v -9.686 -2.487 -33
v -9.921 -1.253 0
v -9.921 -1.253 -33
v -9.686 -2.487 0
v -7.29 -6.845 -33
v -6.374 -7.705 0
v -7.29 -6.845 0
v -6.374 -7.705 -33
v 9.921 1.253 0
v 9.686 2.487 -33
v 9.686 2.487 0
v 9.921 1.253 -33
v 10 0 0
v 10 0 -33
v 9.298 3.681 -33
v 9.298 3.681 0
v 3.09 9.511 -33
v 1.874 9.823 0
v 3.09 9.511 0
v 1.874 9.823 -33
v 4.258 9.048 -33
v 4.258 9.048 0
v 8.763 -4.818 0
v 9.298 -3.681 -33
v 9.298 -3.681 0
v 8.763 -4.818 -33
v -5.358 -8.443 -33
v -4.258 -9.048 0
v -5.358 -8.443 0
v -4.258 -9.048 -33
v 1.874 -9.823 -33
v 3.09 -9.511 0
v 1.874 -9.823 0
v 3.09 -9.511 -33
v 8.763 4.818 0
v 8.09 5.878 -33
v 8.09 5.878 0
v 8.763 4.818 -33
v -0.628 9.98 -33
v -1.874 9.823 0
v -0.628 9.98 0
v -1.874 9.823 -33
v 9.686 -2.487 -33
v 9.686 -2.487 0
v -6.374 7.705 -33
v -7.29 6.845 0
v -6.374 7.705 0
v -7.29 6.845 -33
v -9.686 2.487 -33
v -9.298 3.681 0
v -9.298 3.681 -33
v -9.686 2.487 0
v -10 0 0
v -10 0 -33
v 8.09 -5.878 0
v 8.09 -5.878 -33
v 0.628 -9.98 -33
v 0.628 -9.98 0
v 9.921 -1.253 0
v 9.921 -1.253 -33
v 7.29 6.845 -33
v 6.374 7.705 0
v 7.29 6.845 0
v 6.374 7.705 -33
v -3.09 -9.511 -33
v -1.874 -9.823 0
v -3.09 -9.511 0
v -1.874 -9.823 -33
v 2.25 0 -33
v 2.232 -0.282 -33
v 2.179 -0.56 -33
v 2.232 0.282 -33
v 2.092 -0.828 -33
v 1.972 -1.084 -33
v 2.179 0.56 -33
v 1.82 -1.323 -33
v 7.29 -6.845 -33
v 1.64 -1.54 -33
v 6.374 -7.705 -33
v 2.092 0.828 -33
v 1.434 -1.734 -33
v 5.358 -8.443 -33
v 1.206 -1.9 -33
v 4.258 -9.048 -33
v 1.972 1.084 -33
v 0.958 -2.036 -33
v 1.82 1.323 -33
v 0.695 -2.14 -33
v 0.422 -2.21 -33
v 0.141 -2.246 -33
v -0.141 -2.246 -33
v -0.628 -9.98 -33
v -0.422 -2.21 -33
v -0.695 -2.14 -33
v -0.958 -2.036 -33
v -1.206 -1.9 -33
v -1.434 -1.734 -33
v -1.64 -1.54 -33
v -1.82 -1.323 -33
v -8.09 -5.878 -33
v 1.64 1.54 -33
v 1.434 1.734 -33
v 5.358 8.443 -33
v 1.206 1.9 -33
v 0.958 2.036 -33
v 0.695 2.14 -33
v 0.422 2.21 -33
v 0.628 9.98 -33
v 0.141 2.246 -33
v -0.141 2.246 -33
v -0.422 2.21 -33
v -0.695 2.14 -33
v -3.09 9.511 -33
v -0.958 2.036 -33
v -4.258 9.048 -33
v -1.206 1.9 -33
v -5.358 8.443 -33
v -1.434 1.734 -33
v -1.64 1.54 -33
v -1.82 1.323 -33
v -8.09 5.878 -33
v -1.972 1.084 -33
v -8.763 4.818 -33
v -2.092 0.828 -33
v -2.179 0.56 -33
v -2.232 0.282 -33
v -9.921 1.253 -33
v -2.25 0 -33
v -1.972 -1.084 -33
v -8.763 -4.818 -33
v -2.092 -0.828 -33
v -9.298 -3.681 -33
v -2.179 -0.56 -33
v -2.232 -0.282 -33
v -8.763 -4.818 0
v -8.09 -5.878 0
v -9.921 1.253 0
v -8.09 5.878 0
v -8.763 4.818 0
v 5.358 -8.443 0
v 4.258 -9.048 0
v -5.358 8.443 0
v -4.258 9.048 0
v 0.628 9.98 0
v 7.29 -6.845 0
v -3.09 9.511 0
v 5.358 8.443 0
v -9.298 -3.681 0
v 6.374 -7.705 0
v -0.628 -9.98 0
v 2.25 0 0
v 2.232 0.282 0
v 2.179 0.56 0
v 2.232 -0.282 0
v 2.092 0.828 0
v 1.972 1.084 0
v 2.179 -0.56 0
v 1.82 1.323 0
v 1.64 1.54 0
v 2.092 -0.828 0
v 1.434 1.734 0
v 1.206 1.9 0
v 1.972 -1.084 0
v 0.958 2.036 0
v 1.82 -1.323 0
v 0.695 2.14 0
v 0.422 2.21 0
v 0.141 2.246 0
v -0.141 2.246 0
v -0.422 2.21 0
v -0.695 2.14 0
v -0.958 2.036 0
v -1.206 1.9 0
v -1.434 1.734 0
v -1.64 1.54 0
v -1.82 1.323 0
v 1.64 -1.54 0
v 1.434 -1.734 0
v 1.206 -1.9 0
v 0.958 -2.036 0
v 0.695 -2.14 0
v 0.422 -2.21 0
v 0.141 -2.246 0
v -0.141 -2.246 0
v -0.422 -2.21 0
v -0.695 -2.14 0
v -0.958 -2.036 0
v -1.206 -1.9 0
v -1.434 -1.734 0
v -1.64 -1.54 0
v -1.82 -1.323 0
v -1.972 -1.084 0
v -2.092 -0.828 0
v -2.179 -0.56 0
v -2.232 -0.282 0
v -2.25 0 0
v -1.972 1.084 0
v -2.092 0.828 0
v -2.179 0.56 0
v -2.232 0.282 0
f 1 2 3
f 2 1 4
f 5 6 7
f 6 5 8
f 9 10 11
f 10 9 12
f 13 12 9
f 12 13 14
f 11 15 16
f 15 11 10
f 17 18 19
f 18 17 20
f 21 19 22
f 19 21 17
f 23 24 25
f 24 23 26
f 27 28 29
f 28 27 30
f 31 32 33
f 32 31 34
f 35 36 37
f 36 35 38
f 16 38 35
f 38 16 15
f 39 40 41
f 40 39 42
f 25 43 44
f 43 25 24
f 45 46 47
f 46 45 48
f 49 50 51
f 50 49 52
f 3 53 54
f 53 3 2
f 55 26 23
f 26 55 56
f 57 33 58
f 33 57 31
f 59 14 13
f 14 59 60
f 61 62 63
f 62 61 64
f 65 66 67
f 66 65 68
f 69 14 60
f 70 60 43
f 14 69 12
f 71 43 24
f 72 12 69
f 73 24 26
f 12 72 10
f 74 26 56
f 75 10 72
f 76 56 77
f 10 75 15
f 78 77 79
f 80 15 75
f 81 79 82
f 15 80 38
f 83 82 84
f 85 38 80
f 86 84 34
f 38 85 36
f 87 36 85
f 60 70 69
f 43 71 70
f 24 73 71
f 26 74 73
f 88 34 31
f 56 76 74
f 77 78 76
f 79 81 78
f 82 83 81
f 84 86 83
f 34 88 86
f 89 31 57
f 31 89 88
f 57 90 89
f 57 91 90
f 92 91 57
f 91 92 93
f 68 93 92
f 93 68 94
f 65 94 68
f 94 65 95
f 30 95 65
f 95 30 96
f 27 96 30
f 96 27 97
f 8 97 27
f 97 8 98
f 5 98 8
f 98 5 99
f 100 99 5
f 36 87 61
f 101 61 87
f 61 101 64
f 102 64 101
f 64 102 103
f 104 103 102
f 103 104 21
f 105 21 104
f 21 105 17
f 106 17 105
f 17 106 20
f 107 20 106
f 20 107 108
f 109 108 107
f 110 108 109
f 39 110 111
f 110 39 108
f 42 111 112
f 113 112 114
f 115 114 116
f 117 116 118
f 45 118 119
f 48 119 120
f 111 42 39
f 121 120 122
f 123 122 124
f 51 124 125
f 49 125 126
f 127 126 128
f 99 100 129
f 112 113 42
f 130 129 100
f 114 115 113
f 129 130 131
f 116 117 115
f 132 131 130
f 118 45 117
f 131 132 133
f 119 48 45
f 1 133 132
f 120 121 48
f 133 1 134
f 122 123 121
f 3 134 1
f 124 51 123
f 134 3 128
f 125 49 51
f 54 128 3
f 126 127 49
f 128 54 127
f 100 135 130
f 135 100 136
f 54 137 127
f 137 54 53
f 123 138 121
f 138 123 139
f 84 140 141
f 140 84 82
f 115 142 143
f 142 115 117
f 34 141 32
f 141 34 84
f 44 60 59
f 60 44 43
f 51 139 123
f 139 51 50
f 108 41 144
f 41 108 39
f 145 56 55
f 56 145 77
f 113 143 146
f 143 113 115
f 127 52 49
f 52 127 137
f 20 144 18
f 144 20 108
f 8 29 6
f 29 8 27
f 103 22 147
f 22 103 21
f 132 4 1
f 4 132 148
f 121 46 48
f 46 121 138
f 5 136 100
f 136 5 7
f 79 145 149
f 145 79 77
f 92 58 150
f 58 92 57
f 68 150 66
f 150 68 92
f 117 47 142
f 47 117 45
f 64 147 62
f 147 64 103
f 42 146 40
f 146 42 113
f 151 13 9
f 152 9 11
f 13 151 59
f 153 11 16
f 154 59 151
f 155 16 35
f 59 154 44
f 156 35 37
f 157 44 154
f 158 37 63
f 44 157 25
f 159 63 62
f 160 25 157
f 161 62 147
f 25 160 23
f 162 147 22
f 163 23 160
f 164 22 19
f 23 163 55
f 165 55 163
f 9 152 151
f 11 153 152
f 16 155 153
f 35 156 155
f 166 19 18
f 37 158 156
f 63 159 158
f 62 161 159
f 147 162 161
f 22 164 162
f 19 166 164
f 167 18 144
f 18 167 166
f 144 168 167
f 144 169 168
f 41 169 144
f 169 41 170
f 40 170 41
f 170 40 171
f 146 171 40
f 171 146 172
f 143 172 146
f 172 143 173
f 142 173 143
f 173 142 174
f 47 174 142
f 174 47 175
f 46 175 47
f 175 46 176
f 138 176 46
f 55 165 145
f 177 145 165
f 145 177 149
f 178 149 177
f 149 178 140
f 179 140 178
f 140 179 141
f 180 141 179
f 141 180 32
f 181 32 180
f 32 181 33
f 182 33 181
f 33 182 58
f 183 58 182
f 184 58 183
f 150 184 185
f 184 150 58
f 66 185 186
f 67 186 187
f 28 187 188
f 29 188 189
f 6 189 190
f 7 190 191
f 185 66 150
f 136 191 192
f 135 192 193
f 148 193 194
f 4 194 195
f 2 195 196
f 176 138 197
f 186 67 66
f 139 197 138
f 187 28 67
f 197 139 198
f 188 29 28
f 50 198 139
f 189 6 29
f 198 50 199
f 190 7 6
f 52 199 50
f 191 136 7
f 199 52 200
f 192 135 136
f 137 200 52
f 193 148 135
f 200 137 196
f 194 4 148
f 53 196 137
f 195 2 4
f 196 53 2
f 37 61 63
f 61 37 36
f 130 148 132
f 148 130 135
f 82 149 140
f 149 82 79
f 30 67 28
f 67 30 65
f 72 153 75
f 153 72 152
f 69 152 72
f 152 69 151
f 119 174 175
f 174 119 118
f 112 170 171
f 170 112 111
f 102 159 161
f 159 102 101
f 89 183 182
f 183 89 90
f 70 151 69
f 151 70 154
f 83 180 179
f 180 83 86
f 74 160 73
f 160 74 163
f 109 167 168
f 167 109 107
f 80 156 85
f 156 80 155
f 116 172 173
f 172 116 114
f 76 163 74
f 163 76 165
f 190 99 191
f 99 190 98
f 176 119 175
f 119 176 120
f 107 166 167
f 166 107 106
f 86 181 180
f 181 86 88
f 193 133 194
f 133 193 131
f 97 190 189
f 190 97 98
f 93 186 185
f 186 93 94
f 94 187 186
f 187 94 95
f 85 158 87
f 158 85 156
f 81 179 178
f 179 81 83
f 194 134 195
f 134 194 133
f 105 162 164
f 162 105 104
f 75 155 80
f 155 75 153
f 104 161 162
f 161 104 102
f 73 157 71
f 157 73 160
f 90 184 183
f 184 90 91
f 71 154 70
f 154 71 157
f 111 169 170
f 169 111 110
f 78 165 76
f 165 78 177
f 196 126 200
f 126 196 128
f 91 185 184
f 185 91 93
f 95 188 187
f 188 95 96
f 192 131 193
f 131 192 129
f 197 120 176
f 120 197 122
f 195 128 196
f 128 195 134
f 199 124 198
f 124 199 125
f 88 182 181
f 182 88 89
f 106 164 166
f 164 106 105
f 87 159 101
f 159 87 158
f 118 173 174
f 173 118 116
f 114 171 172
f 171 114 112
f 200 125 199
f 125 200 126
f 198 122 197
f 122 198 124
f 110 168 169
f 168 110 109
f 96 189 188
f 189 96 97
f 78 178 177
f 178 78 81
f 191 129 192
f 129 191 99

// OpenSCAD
$fn = 50;


difference() {
	union() {
		translate(v = [0, 0, -33.0000000000]) {
			cylinder(h = 33, r = 10.0000000000);
		}
	}
	union() {
		#translate(v = [0, 0, -33]) {
			cylinder(h = 33, r = 2.2500000000);
		}
	}
}
